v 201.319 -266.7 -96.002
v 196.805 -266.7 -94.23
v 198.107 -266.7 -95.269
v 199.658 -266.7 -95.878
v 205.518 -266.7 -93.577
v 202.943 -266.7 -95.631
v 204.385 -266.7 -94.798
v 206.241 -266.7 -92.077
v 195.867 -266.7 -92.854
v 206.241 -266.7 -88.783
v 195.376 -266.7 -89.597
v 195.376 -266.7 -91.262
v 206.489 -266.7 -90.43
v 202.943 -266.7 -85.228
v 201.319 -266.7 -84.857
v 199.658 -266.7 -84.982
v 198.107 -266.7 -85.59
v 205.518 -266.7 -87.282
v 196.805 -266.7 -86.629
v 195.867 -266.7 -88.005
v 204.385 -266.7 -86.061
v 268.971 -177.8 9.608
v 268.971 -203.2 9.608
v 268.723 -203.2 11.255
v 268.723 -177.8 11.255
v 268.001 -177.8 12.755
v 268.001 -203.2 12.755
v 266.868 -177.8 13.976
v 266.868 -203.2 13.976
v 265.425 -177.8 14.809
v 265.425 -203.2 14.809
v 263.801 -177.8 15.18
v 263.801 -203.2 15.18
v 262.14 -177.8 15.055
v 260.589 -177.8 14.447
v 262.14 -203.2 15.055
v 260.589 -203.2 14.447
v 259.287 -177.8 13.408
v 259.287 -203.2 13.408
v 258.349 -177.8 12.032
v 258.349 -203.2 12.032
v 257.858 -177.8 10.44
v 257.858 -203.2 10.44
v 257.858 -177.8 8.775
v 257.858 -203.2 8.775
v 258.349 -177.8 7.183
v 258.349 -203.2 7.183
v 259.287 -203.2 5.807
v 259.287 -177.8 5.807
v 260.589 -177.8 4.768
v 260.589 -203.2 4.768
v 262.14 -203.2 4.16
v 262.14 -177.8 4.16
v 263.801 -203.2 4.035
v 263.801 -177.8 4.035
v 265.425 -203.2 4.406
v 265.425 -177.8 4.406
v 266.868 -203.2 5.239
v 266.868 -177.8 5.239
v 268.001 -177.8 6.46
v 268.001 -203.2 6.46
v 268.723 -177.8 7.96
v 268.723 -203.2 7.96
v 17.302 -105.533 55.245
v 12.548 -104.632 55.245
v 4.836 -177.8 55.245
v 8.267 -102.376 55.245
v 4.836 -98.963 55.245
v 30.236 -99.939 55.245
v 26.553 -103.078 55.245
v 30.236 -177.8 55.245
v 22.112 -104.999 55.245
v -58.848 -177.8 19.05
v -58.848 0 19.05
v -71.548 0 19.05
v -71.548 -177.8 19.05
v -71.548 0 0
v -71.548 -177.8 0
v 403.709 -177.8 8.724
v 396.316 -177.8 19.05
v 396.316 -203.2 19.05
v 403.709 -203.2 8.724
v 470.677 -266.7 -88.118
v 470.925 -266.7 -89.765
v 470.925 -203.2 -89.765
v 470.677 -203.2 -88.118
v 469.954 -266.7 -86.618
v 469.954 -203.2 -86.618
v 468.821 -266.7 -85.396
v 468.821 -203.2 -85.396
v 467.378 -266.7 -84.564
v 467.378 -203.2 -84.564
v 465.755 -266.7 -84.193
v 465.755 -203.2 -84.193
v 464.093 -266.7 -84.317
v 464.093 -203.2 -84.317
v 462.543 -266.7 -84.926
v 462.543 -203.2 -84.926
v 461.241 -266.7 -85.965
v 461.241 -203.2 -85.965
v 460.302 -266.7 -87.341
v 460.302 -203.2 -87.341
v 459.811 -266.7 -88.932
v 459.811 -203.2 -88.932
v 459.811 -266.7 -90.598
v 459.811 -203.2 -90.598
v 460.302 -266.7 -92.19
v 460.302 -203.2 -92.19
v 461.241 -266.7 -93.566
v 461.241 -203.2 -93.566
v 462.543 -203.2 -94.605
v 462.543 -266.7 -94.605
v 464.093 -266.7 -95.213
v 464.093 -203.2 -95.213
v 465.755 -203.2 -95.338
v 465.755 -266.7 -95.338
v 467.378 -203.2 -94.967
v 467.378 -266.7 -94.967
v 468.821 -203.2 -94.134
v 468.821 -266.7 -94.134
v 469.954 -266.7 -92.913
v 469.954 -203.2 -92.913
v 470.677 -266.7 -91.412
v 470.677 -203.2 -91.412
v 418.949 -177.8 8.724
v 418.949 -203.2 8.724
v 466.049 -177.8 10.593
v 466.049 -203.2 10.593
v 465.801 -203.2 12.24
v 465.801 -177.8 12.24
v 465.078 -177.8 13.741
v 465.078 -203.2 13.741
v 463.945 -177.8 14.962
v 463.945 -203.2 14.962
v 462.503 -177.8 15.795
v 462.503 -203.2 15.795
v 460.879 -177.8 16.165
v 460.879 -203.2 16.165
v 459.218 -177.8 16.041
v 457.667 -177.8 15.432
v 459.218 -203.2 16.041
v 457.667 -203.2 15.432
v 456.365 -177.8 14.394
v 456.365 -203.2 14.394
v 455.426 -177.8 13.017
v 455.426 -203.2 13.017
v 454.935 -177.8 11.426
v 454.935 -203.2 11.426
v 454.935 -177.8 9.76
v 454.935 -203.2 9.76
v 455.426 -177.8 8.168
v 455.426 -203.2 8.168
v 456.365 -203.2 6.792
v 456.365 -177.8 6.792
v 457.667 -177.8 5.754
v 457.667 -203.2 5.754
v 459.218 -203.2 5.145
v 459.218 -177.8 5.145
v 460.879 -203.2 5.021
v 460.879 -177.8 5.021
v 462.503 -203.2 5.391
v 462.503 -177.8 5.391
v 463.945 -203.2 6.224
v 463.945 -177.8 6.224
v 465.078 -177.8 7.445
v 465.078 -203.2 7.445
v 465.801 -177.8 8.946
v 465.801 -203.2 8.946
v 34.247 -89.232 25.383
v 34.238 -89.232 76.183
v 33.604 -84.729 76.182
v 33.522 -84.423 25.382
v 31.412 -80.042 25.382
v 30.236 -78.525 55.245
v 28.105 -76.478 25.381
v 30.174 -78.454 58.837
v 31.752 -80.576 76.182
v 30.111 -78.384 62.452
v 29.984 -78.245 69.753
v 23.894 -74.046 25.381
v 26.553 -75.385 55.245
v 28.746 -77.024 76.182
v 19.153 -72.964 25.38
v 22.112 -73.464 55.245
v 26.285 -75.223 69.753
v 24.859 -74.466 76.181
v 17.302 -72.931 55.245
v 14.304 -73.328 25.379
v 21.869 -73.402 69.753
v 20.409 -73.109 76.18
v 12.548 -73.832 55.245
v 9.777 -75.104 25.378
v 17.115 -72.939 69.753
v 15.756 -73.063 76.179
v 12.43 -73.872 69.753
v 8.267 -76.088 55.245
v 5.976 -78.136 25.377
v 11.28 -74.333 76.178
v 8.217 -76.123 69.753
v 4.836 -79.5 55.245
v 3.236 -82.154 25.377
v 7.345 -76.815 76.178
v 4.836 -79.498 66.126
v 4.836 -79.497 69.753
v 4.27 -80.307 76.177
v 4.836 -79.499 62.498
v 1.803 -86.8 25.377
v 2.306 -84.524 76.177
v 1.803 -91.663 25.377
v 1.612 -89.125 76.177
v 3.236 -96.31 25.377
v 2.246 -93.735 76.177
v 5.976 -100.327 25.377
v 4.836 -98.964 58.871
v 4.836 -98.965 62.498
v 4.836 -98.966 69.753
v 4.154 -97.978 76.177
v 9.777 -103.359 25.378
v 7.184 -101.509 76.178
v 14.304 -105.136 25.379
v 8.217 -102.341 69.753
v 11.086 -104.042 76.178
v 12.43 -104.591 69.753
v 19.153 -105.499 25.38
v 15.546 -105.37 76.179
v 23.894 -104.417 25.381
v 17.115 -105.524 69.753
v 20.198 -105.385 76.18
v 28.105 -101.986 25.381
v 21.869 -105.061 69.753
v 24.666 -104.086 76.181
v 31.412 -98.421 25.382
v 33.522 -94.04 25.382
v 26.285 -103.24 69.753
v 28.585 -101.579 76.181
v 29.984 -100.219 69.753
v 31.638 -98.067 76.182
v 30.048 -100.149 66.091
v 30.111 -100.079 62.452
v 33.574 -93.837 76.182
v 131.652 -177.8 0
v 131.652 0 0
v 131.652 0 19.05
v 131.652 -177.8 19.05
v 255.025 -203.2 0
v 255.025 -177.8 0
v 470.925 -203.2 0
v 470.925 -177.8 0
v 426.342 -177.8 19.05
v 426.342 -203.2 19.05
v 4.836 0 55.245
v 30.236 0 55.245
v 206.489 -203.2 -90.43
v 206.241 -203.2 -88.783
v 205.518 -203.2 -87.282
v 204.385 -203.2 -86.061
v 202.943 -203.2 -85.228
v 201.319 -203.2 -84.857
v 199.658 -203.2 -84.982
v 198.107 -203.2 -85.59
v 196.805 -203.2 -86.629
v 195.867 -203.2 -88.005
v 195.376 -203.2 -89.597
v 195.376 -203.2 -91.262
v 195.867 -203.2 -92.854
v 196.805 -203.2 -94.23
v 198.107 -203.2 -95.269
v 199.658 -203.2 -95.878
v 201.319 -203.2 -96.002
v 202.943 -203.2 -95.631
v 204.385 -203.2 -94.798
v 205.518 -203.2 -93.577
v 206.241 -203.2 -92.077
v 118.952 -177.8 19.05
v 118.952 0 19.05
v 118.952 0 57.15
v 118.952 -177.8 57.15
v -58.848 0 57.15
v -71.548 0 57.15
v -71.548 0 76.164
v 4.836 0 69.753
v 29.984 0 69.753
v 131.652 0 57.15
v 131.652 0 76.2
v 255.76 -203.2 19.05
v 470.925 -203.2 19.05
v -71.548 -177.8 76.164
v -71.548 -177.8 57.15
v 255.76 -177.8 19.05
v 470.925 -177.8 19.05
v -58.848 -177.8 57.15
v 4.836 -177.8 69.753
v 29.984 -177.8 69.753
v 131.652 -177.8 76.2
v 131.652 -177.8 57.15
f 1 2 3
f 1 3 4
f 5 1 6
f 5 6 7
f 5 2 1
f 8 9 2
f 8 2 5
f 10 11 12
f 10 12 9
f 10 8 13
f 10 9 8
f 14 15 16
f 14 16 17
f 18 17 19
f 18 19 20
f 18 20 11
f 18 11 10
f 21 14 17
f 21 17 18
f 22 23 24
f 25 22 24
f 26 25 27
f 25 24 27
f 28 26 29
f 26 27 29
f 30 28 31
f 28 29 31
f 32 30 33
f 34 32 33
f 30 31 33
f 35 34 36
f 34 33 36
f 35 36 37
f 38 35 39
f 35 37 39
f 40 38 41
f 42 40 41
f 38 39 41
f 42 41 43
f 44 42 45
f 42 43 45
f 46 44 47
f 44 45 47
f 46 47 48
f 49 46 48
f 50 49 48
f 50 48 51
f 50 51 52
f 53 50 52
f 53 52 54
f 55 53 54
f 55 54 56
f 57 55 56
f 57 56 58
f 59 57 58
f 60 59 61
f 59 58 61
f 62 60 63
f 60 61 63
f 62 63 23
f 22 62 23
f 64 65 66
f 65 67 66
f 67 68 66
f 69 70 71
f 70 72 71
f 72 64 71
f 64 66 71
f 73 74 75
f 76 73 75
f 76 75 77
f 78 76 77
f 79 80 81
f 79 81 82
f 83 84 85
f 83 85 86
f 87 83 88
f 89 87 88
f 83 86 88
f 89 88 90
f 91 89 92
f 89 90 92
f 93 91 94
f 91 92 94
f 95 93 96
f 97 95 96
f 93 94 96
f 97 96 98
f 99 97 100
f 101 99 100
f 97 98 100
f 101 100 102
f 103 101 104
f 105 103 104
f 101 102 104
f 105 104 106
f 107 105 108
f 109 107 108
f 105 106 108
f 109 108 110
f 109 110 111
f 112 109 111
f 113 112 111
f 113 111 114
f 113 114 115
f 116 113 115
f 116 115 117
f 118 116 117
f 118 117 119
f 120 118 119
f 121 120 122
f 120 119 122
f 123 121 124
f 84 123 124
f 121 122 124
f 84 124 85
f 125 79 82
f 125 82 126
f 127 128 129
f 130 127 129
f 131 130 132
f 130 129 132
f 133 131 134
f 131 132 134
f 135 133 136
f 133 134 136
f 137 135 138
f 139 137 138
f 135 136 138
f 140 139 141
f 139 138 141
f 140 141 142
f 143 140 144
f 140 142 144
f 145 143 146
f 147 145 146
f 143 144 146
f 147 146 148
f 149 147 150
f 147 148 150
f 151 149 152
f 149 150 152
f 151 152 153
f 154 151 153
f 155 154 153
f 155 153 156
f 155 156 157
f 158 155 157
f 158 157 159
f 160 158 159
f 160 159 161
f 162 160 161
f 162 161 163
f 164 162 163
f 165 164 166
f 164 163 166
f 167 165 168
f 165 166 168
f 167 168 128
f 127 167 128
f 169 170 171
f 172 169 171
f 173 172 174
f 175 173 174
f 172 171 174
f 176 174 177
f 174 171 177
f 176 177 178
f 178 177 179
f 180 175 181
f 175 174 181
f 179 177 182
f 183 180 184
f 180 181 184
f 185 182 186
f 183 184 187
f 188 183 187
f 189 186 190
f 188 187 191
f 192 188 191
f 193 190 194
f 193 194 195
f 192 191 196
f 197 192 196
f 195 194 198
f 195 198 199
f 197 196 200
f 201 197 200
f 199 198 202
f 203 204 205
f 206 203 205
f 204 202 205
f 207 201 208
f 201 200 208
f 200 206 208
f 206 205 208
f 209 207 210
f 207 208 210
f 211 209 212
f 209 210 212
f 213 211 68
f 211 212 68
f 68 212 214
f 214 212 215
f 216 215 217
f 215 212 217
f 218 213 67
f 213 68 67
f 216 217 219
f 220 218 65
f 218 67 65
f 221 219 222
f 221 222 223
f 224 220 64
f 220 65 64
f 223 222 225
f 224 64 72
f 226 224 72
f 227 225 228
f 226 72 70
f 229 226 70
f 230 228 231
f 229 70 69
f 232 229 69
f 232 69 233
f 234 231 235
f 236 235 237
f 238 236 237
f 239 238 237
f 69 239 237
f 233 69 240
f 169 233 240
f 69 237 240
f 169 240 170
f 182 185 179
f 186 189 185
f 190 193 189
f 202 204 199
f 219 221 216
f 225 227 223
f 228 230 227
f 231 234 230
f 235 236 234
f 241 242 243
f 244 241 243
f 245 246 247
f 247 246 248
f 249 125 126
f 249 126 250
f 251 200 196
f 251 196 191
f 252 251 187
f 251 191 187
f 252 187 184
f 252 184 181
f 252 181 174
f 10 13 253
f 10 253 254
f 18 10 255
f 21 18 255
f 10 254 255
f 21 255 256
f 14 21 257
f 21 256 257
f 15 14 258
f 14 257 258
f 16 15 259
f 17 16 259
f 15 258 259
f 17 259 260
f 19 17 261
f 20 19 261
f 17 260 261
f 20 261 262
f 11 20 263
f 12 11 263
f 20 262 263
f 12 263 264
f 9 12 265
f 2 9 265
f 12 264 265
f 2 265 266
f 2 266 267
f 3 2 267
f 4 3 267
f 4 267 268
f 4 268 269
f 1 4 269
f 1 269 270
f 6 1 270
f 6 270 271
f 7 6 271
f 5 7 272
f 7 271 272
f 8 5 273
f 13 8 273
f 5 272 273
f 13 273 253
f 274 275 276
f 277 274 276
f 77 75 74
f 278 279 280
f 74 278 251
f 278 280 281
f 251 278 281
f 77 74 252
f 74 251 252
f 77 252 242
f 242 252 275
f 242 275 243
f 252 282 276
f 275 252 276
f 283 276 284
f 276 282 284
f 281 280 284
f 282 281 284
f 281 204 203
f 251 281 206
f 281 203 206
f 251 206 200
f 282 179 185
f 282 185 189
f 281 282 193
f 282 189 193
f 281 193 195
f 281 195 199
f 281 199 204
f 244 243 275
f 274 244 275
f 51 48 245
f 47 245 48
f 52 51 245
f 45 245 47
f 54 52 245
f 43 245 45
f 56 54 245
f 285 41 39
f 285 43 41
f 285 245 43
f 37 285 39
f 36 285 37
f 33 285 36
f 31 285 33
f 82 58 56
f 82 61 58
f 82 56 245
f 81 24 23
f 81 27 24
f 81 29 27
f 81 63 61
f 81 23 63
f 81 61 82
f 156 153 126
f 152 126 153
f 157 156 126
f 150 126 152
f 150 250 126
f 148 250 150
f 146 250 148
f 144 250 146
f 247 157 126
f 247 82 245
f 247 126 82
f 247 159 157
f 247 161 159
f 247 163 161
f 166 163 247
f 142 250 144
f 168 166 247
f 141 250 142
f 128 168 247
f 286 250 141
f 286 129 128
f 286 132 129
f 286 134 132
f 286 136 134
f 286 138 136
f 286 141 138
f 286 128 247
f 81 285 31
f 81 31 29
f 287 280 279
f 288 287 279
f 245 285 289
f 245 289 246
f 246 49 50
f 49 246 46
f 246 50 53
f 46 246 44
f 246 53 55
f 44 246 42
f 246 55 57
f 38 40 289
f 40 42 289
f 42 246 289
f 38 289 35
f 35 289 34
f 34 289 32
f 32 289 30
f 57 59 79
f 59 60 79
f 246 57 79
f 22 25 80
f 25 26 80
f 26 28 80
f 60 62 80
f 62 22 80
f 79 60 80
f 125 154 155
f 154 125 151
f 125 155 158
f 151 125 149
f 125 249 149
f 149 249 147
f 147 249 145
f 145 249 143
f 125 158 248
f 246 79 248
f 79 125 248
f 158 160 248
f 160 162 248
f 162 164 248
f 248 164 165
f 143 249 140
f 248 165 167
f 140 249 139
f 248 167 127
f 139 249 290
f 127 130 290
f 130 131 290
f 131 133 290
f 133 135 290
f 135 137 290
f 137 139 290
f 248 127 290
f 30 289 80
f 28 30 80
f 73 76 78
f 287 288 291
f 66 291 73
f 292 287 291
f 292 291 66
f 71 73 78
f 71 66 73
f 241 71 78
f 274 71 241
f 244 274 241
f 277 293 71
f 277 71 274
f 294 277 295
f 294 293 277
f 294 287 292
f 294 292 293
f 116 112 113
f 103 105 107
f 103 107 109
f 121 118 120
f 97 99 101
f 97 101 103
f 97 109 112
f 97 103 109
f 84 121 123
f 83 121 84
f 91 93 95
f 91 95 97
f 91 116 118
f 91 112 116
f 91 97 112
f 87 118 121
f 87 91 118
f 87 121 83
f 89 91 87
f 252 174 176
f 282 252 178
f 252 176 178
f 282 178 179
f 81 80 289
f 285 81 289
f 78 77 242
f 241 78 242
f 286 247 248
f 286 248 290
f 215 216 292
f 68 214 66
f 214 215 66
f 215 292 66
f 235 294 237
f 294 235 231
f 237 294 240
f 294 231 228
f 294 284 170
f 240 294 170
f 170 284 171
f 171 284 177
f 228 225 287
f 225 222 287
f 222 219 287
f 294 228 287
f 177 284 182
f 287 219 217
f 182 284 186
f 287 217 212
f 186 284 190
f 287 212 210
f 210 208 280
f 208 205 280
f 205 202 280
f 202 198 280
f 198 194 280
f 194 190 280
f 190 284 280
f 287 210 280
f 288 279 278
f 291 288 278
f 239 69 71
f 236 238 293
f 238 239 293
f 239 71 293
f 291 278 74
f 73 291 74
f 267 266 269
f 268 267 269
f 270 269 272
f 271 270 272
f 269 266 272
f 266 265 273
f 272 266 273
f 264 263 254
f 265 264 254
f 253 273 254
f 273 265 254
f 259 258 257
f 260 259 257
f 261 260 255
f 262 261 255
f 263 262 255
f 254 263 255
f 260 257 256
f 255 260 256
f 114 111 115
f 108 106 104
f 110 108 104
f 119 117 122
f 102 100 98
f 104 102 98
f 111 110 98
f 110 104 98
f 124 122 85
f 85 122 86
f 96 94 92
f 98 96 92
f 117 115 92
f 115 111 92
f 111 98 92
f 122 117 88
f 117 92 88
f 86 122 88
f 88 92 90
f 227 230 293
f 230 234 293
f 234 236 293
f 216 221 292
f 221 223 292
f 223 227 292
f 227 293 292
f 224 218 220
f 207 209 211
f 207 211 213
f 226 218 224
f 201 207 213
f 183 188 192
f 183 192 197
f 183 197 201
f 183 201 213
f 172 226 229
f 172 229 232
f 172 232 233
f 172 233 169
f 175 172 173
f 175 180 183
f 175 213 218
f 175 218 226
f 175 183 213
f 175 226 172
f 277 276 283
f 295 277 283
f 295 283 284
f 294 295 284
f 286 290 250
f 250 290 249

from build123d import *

# Parameters (mm, degrees)
F0_W      = 25.4
F0_H      = 19.05
F1_DEPTH  = 177.8
F3_DEPTH  = 177.8
F4_R      = 16.31295
F5_DEPTH  = 50.8
F7_DEPTH  = 25.4
F9_DEPTH  = 25.4
F10_R     = 5.588
F11_DEPTH = 25.4
F12_R     = 5.588
F13_DEPTH = 25.4
F14_R     = 5.588
F15_DEPTH = 63.5
F16_R     = 5.588
F17_DEPTH = 63.5


with BuildPart() as f1:
    # F0 (on Front) → F1 (new body)
    with BuildSketch(Plane.XZ):
        Polygon((-58.847912, 57.15), (-58.847912, 19.05), (118.952088, 19.05), (118.952088, 57.15), (42.752088, 57.15), (42.752088, 38.1), (17.352088, 38.1), (17.352088, 57.15), align=None)
        Polygon((-71.547912, 19.05), (-71.547912, 0), (131.652088, 0), (131.652088, 19.05), (118.952088, 19.05), (-58.847912, 19.05), align=None)
        Polygon((-71.547912, 57.15), (-58.847912, 57.15), (17.352088, 57.15), (42.752088, 57.15), (118.952088, 57.15), (131.652088, 57.15), (131.652088, 76.2), (-71.547912, 76.163504), align=None)
        with Locations((30.052088, 47.625)):
            Rectangle(F0_W, F0_H)
    extrude(amount=F1_DEPTH)

    # F2 (on face) → F3 (cut)
    with BuildSketch(Plane.XZ.offset(177.8)):
        Polygon((29.984076, 69.753274), (4.835864, 69.753274), (4.835864, 55.244692), (30.235864, 55.244692), align=None)
    extrude(amount=-F3_DEPTH, mode=Mode.SUBTRACT)

    # F4 (on face) → F5 (cut)
    with BuildSketch(Plane(origin=(-0.013682, 0, 76.176352), x_dir=(1, 0, 0.00018), z_dir=(-0.00018, 0, 1))):
        with Locations((17.938372, -89.231625)):
            Circle(F4_R)
    extrude(amount=-F5_DEPTH, mode=Mode.SUBTRACT)


with BuildPart() as f7:
    # F6 (on face) → F7 (new body)
    with BuildSketch(Plane.XZ.offset(177.8)):
        Polygon((255.760223, 19.05), (255.02494, 0), (470.92494, 0), (470.92494, 19.05), align=None)
    extrude(amount=F7_DEPTH)

    # F8 (on face) → F9 (cut)
    with BuildSketch(Plane.XZ.offset(203.2)):
        Polygon((426.342051, 19.05), (396.315972, 19.05), (403.709011, 8.723676), (418.949011, 8.723676), align=None)
    extrude(amount=-F9_DEPTH, mode=Mode.SUBTRACT)

    # F10 (on face) → F11 (cut)
    with BuildSketch(Plane.XZ.offset(203.2)):
        with Locations((263.383478, 9.607533)):
            Circle(F10_R)
    extrude(amount=-F11_DEPTH, mode=Mode.SUBTRACT)

    # F12 (on face) → F13 (cut)
    with BuildSketch(Plane.XZ.offset(203.2)):
        with Locations((460.46108, 10.592921)):
            Circle(F12_R)
    extrude(amount=-F13_DEPTH, mode=Mode.SUBTRACT)


with BuildPart() as f15:
    # F14 (on face) → F15 (new body)
    with BuildSketch(Plane.XZ.offset(203.2)):
        with Locations((200.901389, -90.429612)):
            Circle(F14_R)
    extrude(amount=F15_DEPTH)


with BuildPart() as f17:
    # F16 (on face) → F17 (new body)
    with BuildSketch(Plane.XZ.offset(203.2)):
        with Locations((465.33694, -89.76534)):
            Circle(F16_R)
    extrude(amount=F17_DEPTH)


solid = Compound([f1.part, f7.part, f15.part, f17.part])
